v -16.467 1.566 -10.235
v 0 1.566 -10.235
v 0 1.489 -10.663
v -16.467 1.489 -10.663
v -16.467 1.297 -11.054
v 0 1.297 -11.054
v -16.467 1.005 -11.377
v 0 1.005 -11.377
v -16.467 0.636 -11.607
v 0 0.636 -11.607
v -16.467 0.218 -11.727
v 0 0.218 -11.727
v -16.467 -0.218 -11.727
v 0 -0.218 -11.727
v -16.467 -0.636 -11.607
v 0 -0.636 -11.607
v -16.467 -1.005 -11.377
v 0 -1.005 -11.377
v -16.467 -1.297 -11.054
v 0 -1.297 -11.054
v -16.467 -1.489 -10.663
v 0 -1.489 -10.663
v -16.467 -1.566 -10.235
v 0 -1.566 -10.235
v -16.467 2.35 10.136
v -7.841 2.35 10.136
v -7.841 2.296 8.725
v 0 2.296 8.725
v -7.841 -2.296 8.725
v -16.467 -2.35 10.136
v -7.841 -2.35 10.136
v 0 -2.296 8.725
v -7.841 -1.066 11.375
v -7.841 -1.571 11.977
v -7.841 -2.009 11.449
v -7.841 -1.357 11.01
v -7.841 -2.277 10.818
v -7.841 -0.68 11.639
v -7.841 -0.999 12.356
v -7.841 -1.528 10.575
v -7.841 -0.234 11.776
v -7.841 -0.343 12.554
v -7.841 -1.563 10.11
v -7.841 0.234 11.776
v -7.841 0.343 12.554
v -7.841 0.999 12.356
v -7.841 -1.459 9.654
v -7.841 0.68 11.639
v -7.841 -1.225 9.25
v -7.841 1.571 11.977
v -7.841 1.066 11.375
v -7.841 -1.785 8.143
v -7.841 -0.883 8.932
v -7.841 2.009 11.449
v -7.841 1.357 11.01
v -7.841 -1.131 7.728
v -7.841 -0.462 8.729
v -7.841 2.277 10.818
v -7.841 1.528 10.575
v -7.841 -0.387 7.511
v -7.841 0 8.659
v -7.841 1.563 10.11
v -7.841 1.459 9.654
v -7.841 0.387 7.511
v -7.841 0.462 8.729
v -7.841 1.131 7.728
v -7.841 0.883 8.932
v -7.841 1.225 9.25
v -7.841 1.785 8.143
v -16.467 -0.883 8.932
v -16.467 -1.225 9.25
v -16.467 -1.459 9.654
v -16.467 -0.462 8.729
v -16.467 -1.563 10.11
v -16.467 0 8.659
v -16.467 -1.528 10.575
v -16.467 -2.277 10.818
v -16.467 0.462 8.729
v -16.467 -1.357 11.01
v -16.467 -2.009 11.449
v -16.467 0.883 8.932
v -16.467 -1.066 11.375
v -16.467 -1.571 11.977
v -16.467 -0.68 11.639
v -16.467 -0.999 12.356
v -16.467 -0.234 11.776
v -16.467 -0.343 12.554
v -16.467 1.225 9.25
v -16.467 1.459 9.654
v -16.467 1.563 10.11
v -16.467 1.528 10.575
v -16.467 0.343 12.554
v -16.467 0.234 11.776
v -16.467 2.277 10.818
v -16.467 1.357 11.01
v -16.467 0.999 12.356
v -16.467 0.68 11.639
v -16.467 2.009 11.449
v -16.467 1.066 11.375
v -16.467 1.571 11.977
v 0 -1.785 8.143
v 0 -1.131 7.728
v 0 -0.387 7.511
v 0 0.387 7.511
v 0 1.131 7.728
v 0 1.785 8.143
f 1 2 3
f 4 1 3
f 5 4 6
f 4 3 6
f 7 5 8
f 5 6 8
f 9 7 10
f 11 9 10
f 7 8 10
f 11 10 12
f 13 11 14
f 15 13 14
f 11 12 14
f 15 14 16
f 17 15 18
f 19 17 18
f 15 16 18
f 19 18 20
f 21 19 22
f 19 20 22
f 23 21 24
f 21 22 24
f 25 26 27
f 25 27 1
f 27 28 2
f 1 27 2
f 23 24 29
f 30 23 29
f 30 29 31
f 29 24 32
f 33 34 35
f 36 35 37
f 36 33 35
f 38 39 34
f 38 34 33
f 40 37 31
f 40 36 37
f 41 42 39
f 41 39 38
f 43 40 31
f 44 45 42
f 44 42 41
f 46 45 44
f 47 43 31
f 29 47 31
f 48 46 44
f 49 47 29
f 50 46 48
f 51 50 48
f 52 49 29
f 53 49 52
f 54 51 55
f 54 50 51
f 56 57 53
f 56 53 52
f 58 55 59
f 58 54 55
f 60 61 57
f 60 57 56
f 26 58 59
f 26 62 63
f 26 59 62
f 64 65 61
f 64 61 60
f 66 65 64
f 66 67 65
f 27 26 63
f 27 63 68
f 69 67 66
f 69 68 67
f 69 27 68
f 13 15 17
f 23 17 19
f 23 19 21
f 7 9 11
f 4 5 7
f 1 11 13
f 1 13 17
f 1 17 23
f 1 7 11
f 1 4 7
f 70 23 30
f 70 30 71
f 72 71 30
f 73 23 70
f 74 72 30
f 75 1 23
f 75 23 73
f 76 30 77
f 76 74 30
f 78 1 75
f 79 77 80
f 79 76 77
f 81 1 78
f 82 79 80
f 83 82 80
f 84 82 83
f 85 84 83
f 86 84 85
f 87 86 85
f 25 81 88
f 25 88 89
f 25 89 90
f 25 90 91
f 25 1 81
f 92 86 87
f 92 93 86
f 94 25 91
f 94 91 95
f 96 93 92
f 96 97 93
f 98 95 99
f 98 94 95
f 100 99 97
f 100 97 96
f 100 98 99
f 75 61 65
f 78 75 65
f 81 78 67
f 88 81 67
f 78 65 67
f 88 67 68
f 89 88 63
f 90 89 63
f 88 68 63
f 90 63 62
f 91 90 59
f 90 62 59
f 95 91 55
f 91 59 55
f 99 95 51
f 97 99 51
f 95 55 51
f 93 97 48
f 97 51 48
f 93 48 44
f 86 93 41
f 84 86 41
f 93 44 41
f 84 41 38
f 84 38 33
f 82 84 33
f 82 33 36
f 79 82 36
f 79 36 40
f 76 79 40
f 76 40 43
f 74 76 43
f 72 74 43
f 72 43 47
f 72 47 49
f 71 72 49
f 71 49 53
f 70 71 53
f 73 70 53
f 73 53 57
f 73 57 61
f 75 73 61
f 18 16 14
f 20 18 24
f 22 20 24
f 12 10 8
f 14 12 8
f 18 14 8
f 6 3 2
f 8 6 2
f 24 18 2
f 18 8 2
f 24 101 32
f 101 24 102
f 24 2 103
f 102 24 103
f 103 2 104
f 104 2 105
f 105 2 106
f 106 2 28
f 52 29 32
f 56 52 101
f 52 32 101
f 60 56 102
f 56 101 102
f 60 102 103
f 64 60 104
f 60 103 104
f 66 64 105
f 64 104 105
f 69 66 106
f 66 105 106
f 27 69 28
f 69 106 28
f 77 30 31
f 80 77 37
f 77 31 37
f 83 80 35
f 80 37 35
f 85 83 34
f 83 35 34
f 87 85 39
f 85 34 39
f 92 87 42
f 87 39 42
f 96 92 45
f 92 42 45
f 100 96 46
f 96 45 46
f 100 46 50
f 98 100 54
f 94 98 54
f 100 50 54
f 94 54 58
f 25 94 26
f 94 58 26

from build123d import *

# Parameters (mm, degrees)
BOSS_EXTRUDE1_DEPTH = 16.46682
SKETCH2_R           = 2.7432
CUT_EXTRUDE1_DEPTH  = 7.84098
SKETCH3_R           = 1.56718
CUT_EXTRUDE2_DEPTH  = 9.62584


with BuildPart() as part:
    # Sketch1 → Boss-Extrude1 (new body)
    with BuildSketch(Plane(origin=(0, 0, 0), x_dir=(0, 0, -1), z_dir=(1, 0, 0))):
        with BuildLine():
            Line((-10.13615668, 2.350298814), (10.23492888, 1.566019836))
            ThreePointArc((10.23492888, 1.566019836), (11.741817718, 0), (10.23492888, -1.566019836))
            Line((10.23492888, -1.566019836), (-10.13615668, -2.350298814))
            ThreePointArc((-10.13615668, -2.350298814), (-12.578682282, 0), (-10.13615668, 2.350298814))
        make_face()
    extrude(amount=-BOSS_EXTRUDE1_DEPTH)

    # Sketch2 → Cut-Extrude1 (cut)
    with BuildSketch(Plane(origin=(0, 0, 0), x_dir=(0, 0, -1), z_dir=(1, 0, 0))):
        with Locations((-10.226642282, 0)):
            Circle(SKETCH2_R)
    extrude(amount=-CUT_EXTRUDE1_DEPTH, mode=Mode.SUBTRACT)

    # Sketch3 → Cut-Extrude2 (cut, through all)
    with BuildSketch(Plane(origin=(-7.84098, 0, 0), x_dir=(0, 0, -1), z_dir=(1, 0, 0))):
        with Locations((-10.226642282, 0)):
            Circle(SKETCH3_R)
    extrude(amount=-CUT_EXTRUDE2_DEPTH, mode=Mode.SUBTRACT)


solid = part.part
